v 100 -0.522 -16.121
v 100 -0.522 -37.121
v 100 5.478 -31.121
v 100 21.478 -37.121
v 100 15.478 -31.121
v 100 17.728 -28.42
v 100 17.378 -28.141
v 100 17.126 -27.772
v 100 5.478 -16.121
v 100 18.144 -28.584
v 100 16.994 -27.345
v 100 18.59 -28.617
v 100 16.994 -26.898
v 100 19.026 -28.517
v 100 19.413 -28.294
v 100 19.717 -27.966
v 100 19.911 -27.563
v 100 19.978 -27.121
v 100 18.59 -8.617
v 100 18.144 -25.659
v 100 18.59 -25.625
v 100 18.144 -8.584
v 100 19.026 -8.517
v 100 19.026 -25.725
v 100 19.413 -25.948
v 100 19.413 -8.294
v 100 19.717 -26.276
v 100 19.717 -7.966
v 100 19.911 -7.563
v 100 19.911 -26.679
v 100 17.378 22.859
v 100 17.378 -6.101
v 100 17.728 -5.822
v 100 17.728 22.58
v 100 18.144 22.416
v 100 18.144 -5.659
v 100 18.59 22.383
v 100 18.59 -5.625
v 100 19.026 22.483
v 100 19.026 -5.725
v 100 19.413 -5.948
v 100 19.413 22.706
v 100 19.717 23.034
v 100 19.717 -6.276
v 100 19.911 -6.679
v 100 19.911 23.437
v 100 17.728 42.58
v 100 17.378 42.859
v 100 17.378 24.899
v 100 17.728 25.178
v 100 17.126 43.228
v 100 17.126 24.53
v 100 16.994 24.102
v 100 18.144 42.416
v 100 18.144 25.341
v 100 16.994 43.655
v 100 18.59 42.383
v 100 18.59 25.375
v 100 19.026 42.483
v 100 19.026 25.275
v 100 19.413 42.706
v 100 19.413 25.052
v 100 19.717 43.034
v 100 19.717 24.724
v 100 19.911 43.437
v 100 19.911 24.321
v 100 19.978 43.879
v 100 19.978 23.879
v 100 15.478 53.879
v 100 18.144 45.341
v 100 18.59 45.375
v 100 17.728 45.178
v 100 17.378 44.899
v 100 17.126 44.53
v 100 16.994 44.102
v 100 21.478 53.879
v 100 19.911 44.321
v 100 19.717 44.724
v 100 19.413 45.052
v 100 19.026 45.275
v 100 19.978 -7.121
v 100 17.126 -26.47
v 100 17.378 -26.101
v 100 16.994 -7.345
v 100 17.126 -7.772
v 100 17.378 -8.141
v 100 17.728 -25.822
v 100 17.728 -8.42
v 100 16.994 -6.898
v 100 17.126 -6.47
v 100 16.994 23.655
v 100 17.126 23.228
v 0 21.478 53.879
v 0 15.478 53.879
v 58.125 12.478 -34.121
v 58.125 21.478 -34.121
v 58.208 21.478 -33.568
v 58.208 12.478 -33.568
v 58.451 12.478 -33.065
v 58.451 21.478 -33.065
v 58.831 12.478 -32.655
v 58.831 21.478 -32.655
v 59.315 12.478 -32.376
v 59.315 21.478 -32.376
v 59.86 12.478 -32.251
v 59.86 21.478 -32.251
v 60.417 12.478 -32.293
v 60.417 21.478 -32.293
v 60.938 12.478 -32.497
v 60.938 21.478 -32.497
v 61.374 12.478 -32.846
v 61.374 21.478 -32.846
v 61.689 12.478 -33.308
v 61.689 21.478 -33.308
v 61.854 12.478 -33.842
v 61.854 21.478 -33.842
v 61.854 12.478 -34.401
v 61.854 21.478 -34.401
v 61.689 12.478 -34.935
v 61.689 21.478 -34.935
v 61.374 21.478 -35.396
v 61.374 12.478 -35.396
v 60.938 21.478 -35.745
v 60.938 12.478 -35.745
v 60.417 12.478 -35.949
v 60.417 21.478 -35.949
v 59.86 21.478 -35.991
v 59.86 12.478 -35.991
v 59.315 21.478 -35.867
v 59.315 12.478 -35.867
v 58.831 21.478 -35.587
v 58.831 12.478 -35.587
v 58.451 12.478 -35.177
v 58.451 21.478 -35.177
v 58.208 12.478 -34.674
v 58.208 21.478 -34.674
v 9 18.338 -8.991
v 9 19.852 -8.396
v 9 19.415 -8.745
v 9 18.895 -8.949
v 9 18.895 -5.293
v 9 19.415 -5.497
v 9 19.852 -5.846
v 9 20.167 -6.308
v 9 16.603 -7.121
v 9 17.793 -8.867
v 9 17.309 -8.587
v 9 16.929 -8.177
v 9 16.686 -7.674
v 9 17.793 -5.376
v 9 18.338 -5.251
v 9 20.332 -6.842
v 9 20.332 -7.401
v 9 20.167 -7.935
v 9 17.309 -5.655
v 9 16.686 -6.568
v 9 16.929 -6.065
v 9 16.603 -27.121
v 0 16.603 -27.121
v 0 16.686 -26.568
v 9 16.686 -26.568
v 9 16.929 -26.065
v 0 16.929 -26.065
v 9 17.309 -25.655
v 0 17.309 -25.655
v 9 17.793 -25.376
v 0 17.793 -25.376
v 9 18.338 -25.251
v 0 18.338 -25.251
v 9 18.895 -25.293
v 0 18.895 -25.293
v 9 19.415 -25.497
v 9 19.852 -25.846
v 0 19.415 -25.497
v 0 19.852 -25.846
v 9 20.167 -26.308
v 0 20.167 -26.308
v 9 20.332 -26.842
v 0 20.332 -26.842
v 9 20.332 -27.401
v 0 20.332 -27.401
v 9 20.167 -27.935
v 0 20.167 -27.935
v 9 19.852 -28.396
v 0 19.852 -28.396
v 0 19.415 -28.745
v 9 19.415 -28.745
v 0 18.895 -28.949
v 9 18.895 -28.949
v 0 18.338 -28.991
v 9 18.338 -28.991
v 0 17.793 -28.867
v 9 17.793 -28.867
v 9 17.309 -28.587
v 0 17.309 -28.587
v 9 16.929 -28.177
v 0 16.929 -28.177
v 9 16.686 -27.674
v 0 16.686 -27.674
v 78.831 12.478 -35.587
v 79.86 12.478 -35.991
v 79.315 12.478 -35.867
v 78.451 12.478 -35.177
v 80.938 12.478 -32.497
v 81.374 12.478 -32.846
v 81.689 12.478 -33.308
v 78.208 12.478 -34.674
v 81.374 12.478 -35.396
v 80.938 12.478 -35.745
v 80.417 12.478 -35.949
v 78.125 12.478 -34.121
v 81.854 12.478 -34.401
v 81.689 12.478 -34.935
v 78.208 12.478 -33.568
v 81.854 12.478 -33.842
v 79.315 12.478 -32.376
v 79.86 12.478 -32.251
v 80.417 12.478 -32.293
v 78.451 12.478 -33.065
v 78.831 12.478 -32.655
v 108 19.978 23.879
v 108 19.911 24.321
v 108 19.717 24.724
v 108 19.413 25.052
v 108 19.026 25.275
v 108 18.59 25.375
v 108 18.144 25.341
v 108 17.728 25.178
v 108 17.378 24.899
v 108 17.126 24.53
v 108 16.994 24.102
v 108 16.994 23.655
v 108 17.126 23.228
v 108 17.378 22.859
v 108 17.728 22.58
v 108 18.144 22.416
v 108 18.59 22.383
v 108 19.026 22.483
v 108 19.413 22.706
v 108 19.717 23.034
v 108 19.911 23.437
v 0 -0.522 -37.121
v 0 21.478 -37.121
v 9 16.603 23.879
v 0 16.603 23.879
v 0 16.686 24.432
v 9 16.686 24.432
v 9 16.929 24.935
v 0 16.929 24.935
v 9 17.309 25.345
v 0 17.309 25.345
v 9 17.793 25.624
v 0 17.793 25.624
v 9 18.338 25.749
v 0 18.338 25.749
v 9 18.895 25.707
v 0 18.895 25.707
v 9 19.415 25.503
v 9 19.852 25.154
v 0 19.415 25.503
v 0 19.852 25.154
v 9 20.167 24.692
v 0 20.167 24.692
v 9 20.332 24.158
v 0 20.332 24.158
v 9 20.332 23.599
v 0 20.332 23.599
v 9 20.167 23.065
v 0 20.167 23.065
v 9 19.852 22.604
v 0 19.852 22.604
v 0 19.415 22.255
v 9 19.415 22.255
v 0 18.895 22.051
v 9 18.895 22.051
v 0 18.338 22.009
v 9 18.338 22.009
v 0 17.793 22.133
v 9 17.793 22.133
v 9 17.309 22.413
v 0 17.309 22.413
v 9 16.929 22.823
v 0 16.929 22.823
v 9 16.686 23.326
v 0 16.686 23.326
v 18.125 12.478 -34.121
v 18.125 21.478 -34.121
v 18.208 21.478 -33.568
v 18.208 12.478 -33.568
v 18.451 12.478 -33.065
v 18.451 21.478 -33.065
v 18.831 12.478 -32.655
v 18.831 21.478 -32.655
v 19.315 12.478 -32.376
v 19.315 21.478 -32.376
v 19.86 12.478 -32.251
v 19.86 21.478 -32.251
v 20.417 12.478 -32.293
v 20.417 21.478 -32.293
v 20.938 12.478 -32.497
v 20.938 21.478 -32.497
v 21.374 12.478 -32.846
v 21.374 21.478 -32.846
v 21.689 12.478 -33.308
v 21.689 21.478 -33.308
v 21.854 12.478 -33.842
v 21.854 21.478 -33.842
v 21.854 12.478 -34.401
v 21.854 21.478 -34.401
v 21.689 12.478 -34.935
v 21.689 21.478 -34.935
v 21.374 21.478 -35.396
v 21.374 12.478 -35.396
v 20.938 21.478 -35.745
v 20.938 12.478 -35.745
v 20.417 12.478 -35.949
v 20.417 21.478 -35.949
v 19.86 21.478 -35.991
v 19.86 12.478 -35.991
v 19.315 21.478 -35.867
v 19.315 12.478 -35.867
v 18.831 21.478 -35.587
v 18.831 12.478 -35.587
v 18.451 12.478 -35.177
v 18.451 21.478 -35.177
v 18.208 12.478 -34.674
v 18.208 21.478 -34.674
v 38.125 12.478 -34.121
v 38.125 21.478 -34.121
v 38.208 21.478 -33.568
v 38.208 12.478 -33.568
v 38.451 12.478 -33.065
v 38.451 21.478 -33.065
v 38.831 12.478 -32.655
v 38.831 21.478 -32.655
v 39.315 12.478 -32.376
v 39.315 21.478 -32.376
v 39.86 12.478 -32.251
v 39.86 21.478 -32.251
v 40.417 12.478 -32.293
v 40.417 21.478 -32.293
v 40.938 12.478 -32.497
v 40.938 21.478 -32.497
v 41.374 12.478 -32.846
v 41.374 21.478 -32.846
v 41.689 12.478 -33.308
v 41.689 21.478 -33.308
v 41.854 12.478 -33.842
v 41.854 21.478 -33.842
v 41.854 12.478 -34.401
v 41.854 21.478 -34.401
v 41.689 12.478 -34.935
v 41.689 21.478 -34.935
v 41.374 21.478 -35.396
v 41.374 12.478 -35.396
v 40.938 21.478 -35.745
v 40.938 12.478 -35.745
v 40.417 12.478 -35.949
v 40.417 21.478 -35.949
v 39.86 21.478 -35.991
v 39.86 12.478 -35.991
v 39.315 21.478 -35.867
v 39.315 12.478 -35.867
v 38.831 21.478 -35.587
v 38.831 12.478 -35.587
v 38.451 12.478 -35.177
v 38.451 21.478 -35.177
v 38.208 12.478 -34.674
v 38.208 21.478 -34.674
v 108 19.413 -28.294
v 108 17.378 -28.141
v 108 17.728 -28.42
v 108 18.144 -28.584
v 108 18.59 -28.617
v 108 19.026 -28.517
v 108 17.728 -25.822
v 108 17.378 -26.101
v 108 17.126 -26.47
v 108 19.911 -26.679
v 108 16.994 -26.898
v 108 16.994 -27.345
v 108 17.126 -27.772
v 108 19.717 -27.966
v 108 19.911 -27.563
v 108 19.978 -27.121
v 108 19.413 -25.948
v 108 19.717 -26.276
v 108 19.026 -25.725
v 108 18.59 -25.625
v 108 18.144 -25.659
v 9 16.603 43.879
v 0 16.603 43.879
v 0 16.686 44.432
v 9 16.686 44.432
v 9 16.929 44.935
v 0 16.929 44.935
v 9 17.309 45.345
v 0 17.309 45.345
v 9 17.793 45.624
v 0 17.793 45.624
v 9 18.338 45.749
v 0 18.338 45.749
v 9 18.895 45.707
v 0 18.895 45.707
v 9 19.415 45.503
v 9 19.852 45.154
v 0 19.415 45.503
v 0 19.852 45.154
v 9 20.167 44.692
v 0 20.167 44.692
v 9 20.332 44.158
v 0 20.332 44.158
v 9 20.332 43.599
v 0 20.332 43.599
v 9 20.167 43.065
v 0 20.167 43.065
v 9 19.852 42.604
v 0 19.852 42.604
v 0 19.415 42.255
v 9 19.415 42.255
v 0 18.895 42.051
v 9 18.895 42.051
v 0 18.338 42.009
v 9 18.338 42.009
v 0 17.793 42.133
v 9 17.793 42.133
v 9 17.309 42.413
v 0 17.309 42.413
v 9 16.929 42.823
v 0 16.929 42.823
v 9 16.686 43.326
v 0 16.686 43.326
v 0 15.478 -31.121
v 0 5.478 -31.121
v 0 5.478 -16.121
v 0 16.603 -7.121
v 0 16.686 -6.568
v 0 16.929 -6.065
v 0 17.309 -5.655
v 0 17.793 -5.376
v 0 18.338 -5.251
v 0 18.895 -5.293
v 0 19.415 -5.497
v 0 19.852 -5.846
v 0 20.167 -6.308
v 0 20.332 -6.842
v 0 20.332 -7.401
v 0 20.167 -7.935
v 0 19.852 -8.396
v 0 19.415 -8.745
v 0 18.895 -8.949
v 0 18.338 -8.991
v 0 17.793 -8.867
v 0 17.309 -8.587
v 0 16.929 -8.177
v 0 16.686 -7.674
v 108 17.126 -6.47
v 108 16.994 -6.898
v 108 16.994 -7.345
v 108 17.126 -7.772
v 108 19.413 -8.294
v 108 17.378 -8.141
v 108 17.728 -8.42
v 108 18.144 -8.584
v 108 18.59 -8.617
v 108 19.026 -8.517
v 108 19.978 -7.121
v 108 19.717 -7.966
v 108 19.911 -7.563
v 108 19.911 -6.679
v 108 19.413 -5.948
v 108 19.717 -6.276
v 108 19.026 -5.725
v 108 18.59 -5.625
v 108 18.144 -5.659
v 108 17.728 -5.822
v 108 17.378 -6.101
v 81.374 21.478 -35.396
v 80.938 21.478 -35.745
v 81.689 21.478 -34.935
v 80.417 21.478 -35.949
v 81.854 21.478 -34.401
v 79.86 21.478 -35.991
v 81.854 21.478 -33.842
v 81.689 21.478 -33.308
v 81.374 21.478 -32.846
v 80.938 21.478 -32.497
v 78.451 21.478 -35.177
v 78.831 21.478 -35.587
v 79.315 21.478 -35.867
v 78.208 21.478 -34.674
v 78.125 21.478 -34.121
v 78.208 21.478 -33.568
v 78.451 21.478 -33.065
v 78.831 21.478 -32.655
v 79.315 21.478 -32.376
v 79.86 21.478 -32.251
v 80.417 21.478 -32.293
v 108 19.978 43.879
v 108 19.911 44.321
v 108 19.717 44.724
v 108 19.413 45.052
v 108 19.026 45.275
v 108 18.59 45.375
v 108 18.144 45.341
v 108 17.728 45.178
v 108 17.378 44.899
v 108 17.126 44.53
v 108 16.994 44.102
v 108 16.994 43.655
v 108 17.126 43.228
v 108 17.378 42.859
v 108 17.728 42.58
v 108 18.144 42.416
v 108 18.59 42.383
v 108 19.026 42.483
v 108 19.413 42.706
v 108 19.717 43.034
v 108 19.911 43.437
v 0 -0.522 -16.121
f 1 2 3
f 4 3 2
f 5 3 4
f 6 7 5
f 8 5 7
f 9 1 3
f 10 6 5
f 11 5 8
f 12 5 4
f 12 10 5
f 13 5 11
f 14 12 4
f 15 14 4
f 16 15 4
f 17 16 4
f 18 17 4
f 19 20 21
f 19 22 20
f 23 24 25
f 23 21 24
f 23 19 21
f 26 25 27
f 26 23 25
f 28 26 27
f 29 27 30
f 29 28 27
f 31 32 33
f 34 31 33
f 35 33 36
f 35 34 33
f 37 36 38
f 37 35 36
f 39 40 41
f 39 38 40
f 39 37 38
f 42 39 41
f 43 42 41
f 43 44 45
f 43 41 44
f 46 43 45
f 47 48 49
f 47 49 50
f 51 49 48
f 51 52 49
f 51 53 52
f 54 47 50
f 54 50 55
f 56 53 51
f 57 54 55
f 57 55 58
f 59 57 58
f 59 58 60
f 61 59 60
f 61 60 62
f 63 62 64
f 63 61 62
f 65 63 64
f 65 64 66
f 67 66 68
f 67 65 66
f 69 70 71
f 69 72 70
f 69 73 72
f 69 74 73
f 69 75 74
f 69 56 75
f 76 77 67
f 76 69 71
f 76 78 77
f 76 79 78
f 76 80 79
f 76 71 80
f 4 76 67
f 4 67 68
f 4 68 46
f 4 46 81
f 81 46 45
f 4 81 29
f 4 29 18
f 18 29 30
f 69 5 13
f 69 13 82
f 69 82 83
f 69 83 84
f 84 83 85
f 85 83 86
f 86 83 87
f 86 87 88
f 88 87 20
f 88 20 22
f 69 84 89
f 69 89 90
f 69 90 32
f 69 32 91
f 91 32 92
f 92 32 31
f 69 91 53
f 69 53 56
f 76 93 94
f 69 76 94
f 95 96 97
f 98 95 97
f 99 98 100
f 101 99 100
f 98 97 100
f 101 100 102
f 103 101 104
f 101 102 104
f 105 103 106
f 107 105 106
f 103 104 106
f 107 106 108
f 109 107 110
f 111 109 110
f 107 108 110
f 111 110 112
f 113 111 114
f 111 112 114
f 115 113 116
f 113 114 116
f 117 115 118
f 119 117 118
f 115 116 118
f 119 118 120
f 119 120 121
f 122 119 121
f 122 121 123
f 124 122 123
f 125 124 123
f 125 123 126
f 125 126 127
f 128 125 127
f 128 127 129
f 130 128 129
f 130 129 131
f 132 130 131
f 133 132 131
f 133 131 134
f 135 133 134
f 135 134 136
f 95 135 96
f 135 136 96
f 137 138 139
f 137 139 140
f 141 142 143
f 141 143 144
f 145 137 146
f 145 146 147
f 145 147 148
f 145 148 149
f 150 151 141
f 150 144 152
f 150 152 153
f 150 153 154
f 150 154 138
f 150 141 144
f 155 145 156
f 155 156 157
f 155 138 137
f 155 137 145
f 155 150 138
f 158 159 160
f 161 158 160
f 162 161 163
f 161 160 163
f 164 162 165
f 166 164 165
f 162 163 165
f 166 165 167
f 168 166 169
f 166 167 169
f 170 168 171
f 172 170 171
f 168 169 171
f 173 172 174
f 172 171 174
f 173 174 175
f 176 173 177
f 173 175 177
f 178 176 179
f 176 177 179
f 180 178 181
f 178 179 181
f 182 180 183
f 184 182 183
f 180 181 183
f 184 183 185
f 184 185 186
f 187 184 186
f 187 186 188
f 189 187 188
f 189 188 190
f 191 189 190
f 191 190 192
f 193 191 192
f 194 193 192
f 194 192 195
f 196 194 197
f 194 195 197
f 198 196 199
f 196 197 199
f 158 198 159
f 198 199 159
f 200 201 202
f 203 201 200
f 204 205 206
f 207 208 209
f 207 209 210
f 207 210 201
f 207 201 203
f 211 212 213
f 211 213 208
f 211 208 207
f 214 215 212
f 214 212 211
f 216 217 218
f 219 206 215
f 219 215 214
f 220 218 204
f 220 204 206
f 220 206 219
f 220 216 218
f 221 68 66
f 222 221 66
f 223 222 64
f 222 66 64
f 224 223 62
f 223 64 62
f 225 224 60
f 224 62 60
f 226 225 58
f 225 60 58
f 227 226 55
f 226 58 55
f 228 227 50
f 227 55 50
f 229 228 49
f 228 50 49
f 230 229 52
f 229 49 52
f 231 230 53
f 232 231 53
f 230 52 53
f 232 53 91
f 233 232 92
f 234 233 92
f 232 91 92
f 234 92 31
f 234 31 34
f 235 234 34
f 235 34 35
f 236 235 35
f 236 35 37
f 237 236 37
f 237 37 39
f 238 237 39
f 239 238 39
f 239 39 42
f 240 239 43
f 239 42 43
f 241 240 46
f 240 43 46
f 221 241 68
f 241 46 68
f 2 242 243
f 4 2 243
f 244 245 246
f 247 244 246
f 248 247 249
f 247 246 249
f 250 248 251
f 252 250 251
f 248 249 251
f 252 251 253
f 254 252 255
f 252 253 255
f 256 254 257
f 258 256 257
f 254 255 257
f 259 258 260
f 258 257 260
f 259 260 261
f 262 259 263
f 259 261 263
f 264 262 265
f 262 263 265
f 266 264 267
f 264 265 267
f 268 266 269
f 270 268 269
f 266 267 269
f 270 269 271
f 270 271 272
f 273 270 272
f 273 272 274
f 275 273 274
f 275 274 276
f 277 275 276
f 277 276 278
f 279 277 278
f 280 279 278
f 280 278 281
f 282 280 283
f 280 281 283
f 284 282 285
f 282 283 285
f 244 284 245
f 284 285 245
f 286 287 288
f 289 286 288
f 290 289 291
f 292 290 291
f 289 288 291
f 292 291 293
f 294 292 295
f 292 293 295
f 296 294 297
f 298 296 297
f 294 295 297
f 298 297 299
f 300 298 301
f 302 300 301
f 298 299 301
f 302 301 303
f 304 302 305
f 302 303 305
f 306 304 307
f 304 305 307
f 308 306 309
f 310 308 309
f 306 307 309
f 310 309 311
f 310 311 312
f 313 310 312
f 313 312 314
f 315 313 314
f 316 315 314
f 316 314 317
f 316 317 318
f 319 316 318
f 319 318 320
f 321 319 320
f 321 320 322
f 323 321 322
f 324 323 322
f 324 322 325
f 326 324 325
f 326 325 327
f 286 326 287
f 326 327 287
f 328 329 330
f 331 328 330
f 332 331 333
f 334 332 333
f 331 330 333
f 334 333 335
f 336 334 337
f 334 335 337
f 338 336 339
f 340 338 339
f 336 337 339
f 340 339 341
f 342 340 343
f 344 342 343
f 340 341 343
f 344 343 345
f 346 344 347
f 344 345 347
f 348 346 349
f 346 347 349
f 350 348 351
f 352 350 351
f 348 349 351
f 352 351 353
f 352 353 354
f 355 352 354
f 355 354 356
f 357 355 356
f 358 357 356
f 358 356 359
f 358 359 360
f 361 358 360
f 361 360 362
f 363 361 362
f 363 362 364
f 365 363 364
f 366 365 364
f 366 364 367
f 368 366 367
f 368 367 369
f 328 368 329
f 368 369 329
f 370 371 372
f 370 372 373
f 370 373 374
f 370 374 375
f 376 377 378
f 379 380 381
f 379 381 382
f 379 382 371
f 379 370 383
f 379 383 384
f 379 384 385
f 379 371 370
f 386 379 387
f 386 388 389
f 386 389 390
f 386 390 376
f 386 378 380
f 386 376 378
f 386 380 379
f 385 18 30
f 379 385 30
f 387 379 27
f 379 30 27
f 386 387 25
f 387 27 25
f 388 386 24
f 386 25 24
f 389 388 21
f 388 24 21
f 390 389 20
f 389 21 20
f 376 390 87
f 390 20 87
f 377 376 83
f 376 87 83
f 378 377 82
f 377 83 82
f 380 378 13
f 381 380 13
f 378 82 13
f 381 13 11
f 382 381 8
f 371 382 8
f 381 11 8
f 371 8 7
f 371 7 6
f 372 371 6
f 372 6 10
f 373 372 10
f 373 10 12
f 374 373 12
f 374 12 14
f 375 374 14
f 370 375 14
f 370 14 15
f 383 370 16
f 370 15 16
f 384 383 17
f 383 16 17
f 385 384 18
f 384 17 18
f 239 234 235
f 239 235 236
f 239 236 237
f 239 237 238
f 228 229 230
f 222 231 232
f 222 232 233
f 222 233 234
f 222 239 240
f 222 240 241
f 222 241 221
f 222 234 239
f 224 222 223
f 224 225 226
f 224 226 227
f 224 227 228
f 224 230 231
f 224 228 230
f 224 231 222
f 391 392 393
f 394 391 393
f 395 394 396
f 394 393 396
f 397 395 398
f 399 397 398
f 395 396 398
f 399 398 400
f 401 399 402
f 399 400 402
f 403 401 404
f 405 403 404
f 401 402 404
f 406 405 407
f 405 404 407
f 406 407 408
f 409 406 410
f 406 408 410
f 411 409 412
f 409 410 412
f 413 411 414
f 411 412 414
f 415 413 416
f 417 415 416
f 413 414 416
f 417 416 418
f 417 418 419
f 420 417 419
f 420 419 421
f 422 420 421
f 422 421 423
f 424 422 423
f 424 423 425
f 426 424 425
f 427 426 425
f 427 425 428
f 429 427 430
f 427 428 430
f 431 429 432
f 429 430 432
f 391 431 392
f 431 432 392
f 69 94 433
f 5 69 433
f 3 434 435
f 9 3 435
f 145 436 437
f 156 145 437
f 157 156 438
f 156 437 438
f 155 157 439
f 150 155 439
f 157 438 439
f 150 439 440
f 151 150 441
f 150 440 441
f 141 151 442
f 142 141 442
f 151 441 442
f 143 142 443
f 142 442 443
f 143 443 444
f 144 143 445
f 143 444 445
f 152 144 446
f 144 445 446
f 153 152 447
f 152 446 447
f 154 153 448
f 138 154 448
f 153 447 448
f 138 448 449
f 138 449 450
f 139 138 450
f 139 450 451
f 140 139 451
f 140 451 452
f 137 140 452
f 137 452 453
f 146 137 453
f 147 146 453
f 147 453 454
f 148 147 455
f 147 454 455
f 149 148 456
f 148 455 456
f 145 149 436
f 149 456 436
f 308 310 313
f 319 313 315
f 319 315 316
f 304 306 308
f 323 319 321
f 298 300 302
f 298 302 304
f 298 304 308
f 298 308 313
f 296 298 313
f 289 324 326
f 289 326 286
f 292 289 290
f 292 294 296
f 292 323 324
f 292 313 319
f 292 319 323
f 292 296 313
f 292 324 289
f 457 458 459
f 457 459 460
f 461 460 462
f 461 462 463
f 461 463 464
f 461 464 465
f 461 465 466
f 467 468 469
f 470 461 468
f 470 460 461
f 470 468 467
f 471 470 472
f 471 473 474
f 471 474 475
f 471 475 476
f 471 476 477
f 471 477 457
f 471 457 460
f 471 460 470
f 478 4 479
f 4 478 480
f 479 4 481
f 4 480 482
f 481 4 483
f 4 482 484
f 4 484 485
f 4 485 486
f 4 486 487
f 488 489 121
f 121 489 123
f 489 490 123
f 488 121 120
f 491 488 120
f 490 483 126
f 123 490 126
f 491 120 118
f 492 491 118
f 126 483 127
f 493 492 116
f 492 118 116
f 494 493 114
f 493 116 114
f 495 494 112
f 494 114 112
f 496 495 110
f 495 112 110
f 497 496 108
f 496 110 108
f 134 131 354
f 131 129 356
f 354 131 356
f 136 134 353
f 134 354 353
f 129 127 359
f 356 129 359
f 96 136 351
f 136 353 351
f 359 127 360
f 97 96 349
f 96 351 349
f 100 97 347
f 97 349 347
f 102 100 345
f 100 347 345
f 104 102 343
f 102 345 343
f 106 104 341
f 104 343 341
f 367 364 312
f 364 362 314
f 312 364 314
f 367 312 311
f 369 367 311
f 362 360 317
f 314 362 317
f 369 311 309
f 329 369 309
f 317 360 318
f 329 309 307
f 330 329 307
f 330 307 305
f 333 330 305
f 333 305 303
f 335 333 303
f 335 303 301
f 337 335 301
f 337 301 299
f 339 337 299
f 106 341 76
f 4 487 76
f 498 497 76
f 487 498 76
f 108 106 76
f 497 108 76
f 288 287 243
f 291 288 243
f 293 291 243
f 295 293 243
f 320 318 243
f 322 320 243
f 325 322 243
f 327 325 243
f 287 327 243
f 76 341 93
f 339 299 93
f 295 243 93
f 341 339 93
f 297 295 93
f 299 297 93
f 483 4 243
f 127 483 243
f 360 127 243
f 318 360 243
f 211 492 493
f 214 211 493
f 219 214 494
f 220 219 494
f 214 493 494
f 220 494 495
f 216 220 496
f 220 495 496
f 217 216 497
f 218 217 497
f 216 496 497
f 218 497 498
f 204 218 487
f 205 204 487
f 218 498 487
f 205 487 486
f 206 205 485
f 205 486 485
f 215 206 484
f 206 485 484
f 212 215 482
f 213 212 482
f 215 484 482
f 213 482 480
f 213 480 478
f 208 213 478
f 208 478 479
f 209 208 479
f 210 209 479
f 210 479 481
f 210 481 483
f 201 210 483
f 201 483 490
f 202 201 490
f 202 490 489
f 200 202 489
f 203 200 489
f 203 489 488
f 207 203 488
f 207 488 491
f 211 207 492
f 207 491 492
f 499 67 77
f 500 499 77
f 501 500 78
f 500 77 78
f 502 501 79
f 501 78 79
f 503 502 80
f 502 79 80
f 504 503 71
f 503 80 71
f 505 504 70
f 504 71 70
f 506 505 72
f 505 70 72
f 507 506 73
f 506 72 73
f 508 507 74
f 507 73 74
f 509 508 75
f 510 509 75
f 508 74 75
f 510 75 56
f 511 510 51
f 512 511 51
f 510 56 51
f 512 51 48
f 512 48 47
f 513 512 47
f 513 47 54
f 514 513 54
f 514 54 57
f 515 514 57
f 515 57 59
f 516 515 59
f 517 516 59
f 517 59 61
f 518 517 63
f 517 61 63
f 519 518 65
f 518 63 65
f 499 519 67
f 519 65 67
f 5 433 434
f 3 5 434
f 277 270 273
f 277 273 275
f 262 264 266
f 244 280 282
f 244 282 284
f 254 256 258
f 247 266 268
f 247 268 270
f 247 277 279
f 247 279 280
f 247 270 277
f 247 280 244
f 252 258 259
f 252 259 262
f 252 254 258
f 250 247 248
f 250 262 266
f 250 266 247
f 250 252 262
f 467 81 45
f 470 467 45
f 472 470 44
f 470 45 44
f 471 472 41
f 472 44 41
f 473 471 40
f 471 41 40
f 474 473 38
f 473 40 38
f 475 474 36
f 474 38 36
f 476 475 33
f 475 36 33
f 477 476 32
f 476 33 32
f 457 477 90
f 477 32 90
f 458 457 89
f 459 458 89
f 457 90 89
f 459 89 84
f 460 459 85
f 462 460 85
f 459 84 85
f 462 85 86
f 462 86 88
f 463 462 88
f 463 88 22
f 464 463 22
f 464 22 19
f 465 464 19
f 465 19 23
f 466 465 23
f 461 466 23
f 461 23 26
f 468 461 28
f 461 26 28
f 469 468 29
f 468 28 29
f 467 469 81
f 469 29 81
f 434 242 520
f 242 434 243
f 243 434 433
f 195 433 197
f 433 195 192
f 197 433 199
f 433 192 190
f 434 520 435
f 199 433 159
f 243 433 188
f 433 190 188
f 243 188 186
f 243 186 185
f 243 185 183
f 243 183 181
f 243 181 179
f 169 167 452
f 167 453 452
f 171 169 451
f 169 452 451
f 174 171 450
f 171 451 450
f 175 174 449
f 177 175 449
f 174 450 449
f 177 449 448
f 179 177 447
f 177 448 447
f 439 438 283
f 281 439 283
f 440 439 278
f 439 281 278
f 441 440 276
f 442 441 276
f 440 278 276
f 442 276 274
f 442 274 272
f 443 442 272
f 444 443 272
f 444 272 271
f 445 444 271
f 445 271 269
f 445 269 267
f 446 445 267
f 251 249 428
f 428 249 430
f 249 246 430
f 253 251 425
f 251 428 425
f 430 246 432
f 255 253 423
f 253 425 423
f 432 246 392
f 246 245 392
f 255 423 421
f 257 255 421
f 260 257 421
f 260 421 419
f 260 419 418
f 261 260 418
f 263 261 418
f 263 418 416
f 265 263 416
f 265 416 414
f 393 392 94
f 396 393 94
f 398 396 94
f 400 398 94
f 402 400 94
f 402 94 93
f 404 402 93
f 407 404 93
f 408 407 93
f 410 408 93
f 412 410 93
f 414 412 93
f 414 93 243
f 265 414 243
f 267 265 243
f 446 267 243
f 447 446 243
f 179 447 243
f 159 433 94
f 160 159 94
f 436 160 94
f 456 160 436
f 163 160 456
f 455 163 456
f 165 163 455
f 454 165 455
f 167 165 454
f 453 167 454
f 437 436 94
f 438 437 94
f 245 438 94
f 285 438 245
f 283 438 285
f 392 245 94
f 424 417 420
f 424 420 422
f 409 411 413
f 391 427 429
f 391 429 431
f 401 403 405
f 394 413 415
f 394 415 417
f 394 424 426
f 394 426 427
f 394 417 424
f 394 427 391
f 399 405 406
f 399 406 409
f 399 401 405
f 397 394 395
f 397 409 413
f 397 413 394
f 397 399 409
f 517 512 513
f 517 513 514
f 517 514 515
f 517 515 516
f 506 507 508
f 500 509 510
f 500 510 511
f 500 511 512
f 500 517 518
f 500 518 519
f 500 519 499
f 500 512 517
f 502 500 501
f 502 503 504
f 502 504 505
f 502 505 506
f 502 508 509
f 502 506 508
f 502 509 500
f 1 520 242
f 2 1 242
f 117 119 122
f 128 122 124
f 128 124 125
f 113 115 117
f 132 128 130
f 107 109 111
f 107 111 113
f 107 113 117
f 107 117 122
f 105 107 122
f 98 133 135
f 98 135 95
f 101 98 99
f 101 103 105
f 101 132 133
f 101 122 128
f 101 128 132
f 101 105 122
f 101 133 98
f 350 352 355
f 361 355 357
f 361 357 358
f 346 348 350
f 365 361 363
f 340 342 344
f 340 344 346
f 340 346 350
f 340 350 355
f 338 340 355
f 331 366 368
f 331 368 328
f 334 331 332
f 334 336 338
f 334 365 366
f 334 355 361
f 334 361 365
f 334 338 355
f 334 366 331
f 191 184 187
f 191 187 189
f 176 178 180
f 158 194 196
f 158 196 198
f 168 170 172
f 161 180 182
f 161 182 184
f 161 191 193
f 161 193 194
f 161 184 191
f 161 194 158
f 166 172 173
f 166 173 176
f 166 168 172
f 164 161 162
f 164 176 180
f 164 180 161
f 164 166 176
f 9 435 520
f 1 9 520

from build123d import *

# Parameters (mm, degrees)
F1_DEPTH = 100
F2_R     = 1.5
F3_DEPTH = 8
F4_R     = 1.875
F5_DEPTH = 9
F6_R     = 1.875
F7_DEPTH = 9


with BuildPart() as f1:
    # F0 (on Right) → F1 (new body)
    with BuildSketch(Plane.YZ):
        Polygon((21.477706, -37.121146), (21.477706, 53.878854), (15.477706, 53.878854), (15.477706, -31.121146), (5.477706, -31.121146), (5.477706, -16.121146), (-0.522294, -16.121146), (-0.522294, -37.121146), align=None)
    extrude(amount=F1_DEPTH)

    # F2 (on face) → F3 (join)
    with BuildSketch(Plane.YZ.offset(100)):
        with Locations((18.477706, 43.878854)):
            Circle(F2_R)
        with Locations((18.477706, 23.878854)):
            Circle(F2_R)
        with Locations((18.477706, -7.121146)):
            Circle(F2_R)
        with Locations((18.477706, -27.121146)):
            Circle(F2_R)
    extrude(amount=F3_DEPTH)

    # F4 (on face) → F5 (cut)
    with BuildSketch(Plane(origin=(0, 0, 0), x_dir=(0, -1, 0), z_dir=(-1, 0, 0))):
        with Locations((-18.477706, 23.878854)):
            Circle(F4_R)
        with Locations((-18.477706, 43.878854)):
            Circle(F4_R)
        with Locations((-18.477706, -7.121146)):
            Circle(F4_R)
        with Locations((-18.477706, -27.121146)):
            Circle(F4_R)
    extrude(amount=-F5_DEPTH, mode=Mode.SUBTRACT)

    # F6 (on face) → F7 (cut)
    with BuildSketch(Plane(origin=(0, 21.477706, 0), x_dir=(-1, 0, 0), z_dir=(0, 1, 0))):
        with Locations((-80, -34.121146)):
            Circle(F6_R)
        with Locations((-60, -34.121146)):
            Circle(F6_R)
        with Locations((-40, -34.121146)):
            Circle(F6_R)
        with Locations((-20, -34.121146)):
            Circle(F6_R)
    extrude(amount=-F7_DEPTH, mode=Mode.SUBTRACT)


solid = f1.part
